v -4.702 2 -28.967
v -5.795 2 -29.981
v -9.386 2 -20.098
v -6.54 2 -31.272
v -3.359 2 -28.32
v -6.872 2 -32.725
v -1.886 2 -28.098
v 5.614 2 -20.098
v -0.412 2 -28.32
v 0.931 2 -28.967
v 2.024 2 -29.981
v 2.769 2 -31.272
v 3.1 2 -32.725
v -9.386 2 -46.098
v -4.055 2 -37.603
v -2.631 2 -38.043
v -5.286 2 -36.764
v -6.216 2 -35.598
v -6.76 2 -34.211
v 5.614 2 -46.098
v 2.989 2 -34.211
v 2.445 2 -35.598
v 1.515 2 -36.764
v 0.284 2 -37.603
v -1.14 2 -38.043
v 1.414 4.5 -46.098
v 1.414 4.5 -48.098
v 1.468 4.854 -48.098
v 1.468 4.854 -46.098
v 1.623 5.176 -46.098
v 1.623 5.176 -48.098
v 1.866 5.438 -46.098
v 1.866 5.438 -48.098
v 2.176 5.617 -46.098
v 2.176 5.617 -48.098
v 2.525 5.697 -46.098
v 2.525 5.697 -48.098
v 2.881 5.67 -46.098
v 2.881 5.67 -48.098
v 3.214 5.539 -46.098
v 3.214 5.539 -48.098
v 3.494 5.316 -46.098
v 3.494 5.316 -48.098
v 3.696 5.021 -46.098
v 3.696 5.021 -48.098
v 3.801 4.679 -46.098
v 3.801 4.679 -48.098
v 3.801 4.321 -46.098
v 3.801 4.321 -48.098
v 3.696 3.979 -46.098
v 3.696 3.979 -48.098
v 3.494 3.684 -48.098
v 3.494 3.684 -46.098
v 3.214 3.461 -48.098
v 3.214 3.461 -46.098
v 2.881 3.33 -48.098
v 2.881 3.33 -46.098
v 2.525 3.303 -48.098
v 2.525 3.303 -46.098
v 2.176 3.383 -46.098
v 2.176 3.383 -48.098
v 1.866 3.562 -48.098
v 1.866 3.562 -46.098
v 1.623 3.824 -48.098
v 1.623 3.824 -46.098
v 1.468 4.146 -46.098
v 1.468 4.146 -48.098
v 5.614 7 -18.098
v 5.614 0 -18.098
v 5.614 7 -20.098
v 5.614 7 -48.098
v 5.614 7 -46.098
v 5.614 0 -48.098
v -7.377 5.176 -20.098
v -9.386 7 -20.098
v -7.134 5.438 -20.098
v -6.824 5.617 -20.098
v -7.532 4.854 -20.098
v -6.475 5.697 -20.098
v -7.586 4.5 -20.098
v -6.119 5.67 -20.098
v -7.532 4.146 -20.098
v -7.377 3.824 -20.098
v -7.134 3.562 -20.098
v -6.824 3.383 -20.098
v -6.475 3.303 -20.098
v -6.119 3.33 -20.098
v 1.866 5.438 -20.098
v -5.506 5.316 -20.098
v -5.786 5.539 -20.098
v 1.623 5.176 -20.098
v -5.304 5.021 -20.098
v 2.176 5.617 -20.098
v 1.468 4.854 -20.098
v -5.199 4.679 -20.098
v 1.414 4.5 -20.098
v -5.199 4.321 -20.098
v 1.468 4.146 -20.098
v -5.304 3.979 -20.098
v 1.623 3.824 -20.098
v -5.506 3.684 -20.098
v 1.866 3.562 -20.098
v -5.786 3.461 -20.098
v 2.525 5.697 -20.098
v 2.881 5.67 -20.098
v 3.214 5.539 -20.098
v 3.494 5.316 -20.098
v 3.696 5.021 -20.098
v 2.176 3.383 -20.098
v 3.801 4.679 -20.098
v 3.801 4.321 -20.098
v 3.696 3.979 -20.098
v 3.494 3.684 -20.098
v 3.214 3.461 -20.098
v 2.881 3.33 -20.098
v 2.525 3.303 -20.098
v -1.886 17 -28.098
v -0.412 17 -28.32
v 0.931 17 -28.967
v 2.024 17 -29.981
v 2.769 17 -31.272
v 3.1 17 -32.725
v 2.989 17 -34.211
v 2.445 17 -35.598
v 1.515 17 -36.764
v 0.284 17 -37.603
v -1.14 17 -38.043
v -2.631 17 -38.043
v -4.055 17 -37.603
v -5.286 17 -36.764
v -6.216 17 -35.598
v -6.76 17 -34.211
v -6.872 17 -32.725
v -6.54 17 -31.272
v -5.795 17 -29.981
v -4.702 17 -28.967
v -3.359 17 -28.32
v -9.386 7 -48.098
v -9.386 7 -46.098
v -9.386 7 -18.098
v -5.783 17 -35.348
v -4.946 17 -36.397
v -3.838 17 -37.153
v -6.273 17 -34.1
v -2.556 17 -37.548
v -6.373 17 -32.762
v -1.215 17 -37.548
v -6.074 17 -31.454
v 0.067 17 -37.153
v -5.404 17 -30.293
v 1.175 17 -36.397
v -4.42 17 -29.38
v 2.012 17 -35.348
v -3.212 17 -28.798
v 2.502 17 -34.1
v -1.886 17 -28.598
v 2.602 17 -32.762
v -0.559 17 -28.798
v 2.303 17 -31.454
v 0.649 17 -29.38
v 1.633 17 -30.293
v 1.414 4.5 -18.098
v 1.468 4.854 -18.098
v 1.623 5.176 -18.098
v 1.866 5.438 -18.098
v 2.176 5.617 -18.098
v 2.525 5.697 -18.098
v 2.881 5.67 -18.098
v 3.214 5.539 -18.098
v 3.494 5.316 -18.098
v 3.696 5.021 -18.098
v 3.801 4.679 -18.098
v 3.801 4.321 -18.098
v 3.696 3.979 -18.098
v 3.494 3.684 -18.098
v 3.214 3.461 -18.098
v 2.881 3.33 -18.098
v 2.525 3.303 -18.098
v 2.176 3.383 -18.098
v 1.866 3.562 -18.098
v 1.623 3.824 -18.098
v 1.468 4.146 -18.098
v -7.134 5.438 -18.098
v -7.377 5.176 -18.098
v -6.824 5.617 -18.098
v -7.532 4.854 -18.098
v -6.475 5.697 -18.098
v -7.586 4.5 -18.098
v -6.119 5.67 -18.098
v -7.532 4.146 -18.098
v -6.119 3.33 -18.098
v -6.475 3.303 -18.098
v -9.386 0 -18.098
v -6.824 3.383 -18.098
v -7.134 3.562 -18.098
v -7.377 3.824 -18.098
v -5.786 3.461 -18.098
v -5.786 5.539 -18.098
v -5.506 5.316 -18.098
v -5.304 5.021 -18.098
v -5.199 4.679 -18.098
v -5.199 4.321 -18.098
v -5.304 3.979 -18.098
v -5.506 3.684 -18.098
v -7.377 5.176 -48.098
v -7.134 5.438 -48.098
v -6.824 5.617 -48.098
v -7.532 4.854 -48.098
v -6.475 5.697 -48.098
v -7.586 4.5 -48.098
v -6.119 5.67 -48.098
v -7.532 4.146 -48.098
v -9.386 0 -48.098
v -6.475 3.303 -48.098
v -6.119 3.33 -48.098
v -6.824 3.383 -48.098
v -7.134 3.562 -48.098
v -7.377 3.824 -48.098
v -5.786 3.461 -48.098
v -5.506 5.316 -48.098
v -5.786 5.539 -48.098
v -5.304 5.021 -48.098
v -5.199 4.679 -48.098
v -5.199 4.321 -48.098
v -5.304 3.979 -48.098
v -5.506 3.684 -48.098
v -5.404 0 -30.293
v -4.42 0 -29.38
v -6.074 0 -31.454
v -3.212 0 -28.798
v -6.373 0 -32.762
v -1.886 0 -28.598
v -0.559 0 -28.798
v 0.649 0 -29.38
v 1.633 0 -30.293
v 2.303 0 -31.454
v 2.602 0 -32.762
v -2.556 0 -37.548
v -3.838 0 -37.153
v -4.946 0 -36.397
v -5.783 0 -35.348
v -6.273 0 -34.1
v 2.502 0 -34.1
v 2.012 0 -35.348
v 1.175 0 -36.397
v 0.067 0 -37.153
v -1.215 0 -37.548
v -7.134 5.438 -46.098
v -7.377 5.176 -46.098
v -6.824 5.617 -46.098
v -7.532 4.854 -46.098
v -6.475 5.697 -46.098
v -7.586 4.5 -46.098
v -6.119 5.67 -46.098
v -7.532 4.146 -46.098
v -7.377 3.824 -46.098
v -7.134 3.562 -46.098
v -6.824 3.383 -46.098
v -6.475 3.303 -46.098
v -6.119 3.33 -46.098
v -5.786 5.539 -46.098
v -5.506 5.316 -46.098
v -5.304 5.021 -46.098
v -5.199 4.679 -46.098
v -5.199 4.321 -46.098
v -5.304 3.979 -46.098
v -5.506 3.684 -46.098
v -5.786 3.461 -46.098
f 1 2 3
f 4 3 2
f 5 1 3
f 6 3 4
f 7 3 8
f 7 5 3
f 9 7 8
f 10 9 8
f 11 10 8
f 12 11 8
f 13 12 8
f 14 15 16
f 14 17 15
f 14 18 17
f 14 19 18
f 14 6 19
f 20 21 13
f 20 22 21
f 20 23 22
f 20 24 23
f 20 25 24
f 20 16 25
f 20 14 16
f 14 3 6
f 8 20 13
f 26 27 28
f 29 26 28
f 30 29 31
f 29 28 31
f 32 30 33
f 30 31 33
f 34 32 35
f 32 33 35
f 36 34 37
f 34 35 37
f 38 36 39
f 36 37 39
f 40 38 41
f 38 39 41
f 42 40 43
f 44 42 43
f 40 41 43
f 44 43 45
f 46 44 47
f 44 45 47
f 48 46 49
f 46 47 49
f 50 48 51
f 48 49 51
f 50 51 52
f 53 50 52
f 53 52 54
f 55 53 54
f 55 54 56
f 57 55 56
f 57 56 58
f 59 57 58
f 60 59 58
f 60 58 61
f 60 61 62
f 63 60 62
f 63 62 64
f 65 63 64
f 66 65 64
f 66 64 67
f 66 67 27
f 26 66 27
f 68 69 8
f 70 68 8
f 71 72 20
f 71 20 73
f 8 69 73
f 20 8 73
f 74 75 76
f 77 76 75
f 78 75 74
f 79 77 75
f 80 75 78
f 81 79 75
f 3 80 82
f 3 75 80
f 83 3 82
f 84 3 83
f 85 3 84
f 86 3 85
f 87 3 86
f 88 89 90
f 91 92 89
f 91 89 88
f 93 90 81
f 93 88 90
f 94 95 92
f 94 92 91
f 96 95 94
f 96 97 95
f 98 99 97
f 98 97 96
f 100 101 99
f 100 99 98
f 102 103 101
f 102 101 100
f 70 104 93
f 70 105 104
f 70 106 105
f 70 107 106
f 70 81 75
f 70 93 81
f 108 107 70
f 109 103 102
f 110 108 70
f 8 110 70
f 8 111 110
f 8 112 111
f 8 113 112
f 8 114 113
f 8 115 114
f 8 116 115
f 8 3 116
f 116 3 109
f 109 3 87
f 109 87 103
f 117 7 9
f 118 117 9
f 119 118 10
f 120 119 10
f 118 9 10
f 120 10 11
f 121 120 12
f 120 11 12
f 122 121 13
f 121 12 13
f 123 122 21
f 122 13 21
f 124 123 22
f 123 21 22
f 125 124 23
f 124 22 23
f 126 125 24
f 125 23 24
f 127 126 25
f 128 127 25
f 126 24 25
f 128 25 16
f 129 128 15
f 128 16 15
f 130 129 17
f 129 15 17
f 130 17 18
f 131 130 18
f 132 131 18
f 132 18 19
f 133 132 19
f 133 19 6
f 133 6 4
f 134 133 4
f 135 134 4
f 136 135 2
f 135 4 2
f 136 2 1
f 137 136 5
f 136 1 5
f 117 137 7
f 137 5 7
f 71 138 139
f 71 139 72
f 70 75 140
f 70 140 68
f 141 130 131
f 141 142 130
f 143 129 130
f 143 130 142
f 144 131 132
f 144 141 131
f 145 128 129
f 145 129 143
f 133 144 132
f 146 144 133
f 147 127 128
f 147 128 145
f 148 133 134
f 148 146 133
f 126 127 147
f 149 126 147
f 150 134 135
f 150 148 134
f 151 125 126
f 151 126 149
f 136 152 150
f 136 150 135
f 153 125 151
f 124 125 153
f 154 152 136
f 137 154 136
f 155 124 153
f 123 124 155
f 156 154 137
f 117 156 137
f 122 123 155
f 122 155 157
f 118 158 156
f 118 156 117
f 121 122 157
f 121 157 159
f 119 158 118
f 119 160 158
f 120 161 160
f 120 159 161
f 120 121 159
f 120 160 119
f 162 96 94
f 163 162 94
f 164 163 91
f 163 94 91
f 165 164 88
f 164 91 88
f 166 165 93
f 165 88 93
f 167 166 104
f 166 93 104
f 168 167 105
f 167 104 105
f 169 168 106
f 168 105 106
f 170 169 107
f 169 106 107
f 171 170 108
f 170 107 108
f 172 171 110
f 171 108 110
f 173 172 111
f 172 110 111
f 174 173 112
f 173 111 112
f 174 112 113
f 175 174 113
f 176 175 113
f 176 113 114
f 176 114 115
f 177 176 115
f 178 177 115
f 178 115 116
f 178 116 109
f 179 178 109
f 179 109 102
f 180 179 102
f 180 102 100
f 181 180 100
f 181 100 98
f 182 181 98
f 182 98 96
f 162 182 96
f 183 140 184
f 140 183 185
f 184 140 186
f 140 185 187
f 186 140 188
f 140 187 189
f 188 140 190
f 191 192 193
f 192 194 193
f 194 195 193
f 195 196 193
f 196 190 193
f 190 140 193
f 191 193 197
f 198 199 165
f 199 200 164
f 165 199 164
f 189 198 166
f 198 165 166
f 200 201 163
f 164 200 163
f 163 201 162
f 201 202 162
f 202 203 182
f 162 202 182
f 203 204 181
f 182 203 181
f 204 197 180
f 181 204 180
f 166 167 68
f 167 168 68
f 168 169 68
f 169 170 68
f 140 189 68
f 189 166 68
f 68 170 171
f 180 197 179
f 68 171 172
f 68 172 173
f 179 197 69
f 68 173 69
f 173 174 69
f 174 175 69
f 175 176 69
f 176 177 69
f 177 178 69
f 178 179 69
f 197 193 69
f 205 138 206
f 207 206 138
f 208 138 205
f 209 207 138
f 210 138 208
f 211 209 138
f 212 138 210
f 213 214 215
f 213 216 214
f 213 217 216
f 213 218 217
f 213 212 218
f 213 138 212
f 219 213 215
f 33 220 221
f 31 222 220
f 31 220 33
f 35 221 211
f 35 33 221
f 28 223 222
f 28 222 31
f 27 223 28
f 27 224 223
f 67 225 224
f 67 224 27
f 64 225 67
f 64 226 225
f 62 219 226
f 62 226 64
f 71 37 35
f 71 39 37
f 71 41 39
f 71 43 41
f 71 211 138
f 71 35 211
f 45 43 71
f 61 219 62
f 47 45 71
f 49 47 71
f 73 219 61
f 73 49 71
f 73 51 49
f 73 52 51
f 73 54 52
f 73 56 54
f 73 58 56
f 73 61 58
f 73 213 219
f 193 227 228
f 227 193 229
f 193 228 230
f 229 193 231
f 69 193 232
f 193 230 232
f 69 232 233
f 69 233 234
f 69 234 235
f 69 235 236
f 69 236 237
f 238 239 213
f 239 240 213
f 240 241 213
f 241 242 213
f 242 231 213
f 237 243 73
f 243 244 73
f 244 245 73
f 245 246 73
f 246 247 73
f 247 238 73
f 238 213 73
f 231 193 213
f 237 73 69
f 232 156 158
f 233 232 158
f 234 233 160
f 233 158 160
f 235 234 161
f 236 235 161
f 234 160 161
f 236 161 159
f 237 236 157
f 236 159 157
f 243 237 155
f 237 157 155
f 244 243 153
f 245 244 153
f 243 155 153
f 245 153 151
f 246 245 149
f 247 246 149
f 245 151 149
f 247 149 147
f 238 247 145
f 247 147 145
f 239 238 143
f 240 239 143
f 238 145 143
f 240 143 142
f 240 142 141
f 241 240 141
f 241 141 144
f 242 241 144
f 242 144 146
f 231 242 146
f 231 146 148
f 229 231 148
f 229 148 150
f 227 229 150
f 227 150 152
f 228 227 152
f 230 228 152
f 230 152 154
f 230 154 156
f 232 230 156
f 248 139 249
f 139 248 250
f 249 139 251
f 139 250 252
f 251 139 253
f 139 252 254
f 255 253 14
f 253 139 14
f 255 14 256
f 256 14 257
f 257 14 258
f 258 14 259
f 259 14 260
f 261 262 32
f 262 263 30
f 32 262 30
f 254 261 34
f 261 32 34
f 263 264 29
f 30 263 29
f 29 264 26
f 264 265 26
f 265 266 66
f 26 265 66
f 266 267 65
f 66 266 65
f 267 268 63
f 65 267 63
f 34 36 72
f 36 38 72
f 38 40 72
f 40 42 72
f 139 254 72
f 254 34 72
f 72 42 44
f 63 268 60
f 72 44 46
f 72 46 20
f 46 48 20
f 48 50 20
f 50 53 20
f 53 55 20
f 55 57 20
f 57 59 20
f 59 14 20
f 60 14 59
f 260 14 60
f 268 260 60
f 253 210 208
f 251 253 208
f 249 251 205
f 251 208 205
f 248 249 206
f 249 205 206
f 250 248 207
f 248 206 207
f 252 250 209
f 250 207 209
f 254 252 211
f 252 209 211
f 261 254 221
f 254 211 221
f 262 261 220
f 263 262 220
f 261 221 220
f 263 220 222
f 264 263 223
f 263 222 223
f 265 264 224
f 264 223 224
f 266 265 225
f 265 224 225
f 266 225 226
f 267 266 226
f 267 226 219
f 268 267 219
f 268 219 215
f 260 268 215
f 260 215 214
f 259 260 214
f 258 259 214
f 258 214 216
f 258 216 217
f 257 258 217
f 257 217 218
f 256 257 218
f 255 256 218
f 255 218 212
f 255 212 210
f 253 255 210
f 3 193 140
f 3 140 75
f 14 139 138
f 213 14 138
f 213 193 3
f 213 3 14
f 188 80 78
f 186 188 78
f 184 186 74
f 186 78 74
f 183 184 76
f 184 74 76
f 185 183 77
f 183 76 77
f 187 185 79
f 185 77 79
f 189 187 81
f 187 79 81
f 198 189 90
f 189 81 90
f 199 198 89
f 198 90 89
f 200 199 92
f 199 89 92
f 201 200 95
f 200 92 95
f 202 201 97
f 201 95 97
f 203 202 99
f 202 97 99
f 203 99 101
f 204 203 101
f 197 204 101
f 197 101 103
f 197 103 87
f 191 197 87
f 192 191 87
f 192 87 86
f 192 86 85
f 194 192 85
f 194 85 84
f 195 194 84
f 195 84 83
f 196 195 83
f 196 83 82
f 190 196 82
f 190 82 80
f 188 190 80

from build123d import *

# Parameters (mm, degrees)
ESQUISSE1_W             = 15
ESQUISSE1_H             = 30
BOSS_EXTRU_1_DEPTH      = 2
ESQUISSE4_W             = 15
ESQUISSE4_H             = 2
BOSS_EXTRU_3_DEPTH      = 5
D_GAGEMENT_M21_D        = 2.4
ESQUISSE2_R             = 5
BOSS_EXTRU_2_DEPTH      = 15
ESQUISSE3_R             = 4.5
ENL_V_MAT_EXTRU_3_DEPTH = 52.870421487


with BuildPart() as part:
    # Esquisse1 → Boss.-Extru.1 (new body)
    with BuildSketch(Plane(origin=(0, 0, 0), x_dir=(1, 0, 0), z_dir=(0, 1, 0))):
        with Locations((-1.885547836, 33.098358778)):
            Rectangle(ESQUISSE1_W, ESQUISSE1_H)
    extrude(amount=BOSS_EXTRU_1_DEPTH)

    # Esquisse4 → Boss.-Extru.3 (add)
    with BuildSketch(Plane(origin=(0, 2, 0), x_dir=(1, 0, 0), z_dir=(0, 1, 0))):
        with Locations((-1.885547836, 47.098358778)):
            Rectangle(ESQUISSE4_W, ESQUISSE4_H)
        with Locations((-1.885547836, 19.098358778)):
            Rectangle(ESQUISSE4_W, ESQUISSE4_H)
    extrude(amount=BOSS_EXTRU_3_DEPTH)

    # Dégagement M21 (through all)
    with Locations(Plane.XY.offset(-18.098358778)):
        with Locations((-6.385547836, 4.5), (2.614452164, 4.5)):
            Hole(D_GAGEMENT_M21_D / 2)

    # Esquisse2 → Boss.-Extru.2 (add)
    with BuildSketch(Plane(origin=(0, 2, 0), x_dir=(1, 0, 0), z_dir=(0, 1, 0))):
        with Locations(Location((-1.885547836, 33.098358778, 0), (0, 0, 270))):
            Circle(ESQUISSE2_R)
    extrude(amount=BOSS_EXTRU_2_DEPTH)

    # Esquisse3 → Enlèv. mat.-Extru.3 (cut, through all)
    with BuildSketch(Plane(origin=(0, 17, 0), x_dir=(1, 0, 0), z_dir=(0, 1, 0))):
        with Locations(Location((-1.885547836, 33.098358778, 0), (0, 0, 270))):
            Circle(ESQUISSE3_R)
    extrude(amount=-ENL_V_MAT_EXTRU_3_DEPTH, mode=Mode.SUBTRACT)


solid = part.part
